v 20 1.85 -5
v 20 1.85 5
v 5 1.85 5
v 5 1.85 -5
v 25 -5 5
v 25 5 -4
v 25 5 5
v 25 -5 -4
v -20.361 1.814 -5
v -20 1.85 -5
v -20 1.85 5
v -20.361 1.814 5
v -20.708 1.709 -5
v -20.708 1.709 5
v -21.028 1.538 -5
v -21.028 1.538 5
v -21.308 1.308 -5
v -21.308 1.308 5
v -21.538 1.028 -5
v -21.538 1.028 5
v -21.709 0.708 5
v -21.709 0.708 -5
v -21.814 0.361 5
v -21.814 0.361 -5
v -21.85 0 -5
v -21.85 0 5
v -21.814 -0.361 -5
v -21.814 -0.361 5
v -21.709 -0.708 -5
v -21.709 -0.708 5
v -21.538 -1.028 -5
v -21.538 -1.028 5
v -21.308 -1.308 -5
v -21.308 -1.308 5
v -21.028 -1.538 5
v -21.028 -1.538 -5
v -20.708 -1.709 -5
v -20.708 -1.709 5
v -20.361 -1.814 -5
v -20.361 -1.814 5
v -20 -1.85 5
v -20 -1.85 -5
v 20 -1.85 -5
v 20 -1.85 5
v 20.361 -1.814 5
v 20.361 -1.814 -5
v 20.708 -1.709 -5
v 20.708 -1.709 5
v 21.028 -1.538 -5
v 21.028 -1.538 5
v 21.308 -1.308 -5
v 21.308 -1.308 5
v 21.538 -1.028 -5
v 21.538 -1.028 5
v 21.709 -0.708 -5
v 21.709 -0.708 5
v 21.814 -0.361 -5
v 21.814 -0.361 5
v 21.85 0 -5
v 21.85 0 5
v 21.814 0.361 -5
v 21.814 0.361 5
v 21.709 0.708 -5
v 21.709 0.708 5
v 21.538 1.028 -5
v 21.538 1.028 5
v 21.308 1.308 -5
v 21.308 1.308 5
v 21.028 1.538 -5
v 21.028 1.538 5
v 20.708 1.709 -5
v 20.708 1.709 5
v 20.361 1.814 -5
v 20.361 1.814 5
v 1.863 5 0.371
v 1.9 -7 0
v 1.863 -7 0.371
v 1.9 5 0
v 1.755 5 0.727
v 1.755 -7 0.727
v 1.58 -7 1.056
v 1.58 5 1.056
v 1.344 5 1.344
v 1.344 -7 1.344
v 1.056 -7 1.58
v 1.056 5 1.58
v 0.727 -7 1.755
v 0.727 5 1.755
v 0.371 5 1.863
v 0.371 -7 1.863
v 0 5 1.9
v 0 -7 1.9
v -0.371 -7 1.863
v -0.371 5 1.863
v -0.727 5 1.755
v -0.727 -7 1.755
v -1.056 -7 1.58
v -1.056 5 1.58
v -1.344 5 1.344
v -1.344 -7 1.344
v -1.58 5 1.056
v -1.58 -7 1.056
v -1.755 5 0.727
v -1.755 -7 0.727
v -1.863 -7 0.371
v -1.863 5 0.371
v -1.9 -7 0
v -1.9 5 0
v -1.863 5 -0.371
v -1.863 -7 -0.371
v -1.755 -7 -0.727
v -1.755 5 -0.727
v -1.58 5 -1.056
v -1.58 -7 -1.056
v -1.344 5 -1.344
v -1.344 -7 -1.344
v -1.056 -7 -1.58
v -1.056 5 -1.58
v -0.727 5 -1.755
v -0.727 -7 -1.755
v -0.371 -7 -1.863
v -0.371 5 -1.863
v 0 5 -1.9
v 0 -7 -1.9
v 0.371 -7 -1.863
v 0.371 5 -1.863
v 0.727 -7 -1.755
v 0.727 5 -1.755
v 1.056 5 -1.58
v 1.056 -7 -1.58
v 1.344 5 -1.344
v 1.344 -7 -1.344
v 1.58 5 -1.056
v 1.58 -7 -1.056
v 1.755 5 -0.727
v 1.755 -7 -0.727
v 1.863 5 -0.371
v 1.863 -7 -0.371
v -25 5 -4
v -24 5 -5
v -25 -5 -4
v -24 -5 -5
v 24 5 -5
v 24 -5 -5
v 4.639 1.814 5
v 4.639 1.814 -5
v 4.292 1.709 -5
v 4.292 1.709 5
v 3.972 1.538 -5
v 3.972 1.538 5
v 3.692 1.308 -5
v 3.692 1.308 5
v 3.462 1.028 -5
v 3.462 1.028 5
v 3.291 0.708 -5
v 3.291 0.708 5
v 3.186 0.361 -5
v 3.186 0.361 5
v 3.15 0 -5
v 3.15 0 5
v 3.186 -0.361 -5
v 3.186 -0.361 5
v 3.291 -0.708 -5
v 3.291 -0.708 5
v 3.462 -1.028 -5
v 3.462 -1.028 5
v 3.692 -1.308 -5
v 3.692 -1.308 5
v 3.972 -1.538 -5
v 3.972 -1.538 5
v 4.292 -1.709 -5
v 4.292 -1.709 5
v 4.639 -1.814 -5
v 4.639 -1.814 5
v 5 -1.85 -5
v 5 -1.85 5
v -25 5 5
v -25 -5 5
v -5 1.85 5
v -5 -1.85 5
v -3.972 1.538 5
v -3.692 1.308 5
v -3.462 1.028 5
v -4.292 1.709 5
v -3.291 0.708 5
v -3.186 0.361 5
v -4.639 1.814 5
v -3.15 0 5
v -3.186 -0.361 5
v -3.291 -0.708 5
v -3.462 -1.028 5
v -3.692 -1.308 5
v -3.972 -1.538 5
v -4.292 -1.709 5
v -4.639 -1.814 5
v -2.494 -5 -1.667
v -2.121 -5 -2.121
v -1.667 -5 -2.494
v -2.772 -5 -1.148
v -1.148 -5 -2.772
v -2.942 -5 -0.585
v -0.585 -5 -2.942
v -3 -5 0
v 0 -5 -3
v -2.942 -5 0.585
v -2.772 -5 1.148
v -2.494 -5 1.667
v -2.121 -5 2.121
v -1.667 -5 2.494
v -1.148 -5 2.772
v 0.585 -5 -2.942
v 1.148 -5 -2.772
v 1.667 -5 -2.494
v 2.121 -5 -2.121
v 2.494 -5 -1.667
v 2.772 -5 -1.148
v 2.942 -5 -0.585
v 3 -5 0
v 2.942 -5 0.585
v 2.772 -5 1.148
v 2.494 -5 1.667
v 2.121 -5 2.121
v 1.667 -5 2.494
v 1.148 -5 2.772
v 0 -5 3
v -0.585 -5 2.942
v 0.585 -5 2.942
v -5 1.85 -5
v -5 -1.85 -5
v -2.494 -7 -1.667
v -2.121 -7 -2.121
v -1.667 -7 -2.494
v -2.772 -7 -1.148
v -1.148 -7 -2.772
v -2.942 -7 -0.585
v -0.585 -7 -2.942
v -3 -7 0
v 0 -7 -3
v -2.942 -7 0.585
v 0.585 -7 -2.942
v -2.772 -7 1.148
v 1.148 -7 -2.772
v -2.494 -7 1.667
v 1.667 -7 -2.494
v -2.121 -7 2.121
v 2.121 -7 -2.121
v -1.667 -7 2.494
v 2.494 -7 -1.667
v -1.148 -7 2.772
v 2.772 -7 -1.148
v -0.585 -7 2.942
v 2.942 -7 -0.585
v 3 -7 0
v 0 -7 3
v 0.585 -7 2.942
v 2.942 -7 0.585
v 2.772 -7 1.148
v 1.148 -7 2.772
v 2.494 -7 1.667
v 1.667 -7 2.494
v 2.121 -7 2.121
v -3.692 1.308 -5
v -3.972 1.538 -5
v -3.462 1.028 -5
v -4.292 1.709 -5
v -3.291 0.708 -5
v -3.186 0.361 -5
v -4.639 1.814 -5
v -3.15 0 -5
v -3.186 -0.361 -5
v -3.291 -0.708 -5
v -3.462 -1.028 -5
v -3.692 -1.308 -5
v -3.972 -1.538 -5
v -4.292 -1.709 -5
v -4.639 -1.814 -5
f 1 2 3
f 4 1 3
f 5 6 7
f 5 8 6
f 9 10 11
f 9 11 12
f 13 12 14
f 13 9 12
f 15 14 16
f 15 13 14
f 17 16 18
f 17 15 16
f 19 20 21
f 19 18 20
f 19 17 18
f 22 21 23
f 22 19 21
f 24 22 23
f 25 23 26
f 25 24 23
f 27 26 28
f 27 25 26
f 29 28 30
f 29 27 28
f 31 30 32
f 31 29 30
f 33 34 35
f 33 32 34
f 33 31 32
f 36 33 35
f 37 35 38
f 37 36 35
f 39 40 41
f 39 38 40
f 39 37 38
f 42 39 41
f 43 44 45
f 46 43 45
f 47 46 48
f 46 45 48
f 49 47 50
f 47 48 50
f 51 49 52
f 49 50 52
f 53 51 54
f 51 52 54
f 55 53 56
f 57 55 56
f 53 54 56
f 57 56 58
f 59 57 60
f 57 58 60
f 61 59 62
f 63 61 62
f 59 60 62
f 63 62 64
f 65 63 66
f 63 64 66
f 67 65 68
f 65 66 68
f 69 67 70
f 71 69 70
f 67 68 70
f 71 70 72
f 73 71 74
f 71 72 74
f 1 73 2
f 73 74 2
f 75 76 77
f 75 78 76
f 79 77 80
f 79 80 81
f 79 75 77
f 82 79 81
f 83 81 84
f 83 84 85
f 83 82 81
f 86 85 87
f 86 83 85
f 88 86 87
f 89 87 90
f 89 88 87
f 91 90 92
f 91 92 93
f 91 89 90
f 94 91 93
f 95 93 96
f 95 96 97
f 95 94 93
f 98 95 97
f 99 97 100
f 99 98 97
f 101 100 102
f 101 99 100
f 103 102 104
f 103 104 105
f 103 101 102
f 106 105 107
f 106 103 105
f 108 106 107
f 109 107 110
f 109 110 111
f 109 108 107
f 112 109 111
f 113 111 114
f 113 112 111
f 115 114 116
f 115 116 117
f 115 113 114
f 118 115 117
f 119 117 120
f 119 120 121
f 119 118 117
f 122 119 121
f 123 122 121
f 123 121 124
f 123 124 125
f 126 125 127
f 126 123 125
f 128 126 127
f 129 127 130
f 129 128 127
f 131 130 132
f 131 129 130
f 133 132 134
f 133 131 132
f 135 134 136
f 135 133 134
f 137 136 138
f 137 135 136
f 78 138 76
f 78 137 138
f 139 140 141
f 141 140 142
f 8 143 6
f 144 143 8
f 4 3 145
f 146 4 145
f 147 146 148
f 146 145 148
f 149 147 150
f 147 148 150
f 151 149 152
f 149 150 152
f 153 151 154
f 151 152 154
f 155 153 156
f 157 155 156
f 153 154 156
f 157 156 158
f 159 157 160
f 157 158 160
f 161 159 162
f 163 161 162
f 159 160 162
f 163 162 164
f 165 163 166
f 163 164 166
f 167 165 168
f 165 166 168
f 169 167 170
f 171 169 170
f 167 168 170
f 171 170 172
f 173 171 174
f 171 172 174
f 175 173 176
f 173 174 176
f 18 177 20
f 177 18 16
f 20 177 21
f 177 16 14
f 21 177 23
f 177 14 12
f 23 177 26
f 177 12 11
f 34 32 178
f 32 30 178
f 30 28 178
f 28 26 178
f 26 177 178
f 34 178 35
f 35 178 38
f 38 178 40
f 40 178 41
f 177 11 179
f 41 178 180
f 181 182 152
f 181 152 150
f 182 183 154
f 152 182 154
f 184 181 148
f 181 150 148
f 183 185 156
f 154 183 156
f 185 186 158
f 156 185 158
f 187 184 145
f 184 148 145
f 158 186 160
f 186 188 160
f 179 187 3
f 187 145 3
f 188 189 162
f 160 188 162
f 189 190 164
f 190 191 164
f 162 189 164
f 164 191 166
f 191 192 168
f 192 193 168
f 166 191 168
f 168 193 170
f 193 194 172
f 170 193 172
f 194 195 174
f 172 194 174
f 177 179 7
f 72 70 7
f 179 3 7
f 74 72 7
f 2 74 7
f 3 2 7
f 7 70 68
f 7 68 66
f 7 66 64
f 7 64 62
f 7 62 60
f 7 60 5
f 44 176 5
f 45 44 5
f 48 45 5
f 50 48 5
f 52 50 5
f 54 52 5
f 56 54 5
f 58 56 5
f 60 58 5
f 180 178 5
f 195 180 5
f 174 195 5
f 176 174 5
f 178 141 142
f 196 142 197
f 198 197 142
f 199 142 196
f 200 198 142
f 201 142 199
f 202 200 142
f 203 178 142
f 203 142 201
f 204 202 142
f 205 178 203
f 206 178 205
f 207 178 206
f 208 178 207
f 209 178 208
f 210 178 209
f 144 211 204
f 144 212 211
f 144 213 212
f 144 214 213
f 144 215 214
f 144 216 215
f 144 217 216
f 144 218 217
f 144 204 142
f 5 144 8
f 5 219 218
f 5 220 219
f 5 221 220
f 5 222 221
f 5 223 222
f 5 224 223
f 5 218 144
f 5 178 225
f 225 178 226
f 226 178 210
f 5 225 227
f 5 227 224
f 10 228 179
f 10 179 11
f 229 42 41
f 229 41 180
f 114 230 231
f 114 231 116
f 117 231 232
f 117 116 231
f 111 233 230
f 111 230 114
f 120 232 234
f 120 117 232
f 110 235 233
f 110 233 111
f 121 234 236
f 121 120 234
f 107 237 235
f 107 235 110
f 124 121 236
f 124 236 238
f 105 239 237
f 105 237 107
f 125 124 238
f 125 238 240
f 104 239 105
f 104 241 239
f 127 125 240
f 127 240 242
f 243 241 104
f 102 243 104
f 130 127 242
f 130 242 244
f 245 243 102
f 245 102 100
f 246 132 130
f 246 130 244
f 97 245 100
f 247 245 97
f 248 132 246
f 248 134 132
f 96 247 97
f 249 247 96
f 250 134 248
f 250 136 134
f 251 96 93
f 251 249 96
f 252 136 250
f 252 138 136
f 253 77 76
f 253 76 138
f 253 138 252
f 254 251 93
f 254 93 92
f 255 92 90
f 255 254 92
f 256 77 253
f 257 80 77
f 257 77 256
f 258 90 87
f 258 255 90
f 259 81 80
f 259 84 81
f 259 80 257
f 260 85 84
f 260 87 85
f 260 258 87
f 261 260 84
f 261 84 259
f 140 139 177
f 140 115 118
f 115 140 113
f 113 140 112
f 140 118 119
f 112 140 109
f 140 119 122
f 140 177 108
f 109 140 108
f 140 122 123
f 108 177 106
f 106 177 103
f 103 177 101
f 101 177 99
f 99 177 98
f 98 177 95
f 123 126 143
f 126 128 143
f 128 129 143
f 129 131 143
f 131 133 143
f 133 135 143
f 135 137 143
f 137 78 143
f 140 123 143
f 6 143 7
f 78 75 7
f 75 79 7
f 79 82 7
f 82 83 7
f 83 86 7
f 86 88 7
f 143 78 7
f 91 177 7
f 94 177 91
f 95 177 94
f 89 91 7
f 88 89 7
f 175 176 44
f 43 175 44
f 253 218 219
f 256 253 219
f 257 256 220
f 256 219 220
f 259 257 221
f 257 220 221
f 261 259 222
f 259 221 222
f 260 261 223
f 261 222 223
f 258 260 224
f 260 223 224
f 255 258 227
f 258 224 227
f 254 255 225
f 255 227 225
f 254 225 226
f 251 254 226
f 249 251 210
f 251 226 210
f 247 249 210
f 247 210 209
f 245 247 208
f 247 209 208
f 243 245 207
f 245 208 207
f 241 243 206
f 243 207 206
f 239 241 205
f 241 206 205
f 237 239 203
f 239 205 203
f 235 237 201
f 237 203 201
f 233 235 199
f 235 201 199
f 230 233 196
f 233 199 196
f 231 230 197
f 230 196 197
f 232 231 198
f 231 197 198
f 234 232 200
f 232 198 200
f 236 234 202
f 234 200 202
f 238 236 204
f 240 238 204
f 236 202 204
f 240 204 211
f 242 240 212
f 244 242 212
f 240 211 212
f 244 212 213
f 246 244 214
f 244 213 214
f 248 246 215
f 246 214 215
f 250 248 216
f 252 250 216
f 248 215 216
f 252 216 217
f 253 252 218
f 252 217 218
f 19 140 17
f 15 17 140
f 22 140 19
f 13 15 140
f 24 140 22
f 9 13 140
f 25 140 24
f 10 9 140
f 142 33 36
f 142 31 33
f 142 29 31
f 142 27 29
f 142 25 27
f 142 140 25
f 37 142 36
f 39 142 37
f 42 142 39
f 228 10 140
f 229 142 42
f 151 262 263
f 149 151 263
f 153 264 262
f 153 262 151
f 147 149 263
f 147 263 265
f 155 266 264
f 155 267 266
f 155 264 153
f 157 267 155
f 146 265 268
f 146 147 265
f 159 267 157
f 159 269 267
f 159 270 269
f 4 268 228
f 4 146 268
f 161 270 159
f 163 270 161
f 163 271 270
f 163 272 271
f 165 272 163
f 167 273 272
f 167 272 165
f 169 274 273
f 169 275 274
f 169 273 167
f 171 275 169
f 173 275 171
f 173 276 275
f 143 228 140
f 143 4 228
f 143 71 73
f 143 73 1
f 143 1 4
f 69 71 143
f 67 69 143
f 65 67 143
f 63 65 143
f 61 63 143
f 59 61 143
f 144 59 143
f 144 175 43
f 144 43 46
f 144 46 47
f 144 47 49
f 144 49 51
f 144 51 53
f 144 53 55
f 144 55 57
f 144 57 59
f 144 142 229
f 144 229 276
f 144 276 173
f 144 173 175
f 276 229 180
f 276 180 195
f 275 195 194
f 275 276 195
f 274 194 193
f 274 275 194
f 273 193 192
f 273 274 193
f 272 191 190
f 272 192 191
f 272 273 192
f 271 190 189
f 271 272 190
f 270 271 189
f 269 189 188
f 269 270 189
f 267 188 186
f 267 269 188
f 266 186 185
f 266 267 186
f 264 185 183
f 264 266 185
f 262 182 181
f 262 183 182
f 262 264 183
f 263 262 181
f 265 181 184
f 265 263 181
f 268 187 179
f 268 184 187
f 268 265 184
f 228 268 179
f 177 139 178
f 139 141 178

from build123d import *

# Parameters (mm, degrees)
F0_W     = 50
F0_H     = 10
F0_R     = 1.9
F1_DEPTH = 5
F2_SIZE  = 1
F4_DEPTH = 12.5
F5_R     = 3
F5_R_2   = 1.9
F6_DEPTH = 2


# Not quite as in the source:
# - a feature names something its author has since deleted; it is built from what else it names


with BuildPart() as f1:
    # F0 (on Front) → F1 (new body, symmetric)
    with BuildSketch(Plane.XZ):
        Rectangle(F0_W, F0_H)
        Circle(F0_R, mode=Mode.SUBTRACT)
    extrude(amount=F1_DEPTH, both=True)

    # F2
    f2_edges = [f1.edges().sort_by_distance(p)[0] for p in [
        (-25, 0, -5),
        (25, 0, -5),
    ]]
    chamfer(f2_edges, length=F2_SIZE)

    # F3 (on Top) → F4 (cut, symmetric)
    with BuildSketch(Plane.XY):
        with BuildLine():
            ThreePointArc((-20, 1.85), (-21.85, 0), (-20, -1.85))
            Line((-20, -1.85), (-5, -1.85))
            ThreePointArc((-5, -1.85), (-3.15, 0), (-5, 1.85))
            Line((-5, 1.85), (-20, 1.85))
        make_face()
        with BuildLine():
            Line((5, -1.85), (20, -1.85))
            ThreePointArc((20, -1.85), (21.85, 0), (20, 1.85))
            Line((20, 1.85), (5, 1.85))
            ThreePointArc((5, 1.85), (3.15, 0), (5, -1.85))
        make_face()
    extrude(amount=F4_DEPTH, both=True, mode=Mode.SUBTRACT)

    # F5 (on face) → F6 (join)
    with BuildSketch(Plane.XZ.offset(5)):
        Circle(F5_R)
        Circle(F5_R_2, mode=Mode.SUBTRACT)
    extrude(amount=F6_DEPTH)


solid = f1.part
